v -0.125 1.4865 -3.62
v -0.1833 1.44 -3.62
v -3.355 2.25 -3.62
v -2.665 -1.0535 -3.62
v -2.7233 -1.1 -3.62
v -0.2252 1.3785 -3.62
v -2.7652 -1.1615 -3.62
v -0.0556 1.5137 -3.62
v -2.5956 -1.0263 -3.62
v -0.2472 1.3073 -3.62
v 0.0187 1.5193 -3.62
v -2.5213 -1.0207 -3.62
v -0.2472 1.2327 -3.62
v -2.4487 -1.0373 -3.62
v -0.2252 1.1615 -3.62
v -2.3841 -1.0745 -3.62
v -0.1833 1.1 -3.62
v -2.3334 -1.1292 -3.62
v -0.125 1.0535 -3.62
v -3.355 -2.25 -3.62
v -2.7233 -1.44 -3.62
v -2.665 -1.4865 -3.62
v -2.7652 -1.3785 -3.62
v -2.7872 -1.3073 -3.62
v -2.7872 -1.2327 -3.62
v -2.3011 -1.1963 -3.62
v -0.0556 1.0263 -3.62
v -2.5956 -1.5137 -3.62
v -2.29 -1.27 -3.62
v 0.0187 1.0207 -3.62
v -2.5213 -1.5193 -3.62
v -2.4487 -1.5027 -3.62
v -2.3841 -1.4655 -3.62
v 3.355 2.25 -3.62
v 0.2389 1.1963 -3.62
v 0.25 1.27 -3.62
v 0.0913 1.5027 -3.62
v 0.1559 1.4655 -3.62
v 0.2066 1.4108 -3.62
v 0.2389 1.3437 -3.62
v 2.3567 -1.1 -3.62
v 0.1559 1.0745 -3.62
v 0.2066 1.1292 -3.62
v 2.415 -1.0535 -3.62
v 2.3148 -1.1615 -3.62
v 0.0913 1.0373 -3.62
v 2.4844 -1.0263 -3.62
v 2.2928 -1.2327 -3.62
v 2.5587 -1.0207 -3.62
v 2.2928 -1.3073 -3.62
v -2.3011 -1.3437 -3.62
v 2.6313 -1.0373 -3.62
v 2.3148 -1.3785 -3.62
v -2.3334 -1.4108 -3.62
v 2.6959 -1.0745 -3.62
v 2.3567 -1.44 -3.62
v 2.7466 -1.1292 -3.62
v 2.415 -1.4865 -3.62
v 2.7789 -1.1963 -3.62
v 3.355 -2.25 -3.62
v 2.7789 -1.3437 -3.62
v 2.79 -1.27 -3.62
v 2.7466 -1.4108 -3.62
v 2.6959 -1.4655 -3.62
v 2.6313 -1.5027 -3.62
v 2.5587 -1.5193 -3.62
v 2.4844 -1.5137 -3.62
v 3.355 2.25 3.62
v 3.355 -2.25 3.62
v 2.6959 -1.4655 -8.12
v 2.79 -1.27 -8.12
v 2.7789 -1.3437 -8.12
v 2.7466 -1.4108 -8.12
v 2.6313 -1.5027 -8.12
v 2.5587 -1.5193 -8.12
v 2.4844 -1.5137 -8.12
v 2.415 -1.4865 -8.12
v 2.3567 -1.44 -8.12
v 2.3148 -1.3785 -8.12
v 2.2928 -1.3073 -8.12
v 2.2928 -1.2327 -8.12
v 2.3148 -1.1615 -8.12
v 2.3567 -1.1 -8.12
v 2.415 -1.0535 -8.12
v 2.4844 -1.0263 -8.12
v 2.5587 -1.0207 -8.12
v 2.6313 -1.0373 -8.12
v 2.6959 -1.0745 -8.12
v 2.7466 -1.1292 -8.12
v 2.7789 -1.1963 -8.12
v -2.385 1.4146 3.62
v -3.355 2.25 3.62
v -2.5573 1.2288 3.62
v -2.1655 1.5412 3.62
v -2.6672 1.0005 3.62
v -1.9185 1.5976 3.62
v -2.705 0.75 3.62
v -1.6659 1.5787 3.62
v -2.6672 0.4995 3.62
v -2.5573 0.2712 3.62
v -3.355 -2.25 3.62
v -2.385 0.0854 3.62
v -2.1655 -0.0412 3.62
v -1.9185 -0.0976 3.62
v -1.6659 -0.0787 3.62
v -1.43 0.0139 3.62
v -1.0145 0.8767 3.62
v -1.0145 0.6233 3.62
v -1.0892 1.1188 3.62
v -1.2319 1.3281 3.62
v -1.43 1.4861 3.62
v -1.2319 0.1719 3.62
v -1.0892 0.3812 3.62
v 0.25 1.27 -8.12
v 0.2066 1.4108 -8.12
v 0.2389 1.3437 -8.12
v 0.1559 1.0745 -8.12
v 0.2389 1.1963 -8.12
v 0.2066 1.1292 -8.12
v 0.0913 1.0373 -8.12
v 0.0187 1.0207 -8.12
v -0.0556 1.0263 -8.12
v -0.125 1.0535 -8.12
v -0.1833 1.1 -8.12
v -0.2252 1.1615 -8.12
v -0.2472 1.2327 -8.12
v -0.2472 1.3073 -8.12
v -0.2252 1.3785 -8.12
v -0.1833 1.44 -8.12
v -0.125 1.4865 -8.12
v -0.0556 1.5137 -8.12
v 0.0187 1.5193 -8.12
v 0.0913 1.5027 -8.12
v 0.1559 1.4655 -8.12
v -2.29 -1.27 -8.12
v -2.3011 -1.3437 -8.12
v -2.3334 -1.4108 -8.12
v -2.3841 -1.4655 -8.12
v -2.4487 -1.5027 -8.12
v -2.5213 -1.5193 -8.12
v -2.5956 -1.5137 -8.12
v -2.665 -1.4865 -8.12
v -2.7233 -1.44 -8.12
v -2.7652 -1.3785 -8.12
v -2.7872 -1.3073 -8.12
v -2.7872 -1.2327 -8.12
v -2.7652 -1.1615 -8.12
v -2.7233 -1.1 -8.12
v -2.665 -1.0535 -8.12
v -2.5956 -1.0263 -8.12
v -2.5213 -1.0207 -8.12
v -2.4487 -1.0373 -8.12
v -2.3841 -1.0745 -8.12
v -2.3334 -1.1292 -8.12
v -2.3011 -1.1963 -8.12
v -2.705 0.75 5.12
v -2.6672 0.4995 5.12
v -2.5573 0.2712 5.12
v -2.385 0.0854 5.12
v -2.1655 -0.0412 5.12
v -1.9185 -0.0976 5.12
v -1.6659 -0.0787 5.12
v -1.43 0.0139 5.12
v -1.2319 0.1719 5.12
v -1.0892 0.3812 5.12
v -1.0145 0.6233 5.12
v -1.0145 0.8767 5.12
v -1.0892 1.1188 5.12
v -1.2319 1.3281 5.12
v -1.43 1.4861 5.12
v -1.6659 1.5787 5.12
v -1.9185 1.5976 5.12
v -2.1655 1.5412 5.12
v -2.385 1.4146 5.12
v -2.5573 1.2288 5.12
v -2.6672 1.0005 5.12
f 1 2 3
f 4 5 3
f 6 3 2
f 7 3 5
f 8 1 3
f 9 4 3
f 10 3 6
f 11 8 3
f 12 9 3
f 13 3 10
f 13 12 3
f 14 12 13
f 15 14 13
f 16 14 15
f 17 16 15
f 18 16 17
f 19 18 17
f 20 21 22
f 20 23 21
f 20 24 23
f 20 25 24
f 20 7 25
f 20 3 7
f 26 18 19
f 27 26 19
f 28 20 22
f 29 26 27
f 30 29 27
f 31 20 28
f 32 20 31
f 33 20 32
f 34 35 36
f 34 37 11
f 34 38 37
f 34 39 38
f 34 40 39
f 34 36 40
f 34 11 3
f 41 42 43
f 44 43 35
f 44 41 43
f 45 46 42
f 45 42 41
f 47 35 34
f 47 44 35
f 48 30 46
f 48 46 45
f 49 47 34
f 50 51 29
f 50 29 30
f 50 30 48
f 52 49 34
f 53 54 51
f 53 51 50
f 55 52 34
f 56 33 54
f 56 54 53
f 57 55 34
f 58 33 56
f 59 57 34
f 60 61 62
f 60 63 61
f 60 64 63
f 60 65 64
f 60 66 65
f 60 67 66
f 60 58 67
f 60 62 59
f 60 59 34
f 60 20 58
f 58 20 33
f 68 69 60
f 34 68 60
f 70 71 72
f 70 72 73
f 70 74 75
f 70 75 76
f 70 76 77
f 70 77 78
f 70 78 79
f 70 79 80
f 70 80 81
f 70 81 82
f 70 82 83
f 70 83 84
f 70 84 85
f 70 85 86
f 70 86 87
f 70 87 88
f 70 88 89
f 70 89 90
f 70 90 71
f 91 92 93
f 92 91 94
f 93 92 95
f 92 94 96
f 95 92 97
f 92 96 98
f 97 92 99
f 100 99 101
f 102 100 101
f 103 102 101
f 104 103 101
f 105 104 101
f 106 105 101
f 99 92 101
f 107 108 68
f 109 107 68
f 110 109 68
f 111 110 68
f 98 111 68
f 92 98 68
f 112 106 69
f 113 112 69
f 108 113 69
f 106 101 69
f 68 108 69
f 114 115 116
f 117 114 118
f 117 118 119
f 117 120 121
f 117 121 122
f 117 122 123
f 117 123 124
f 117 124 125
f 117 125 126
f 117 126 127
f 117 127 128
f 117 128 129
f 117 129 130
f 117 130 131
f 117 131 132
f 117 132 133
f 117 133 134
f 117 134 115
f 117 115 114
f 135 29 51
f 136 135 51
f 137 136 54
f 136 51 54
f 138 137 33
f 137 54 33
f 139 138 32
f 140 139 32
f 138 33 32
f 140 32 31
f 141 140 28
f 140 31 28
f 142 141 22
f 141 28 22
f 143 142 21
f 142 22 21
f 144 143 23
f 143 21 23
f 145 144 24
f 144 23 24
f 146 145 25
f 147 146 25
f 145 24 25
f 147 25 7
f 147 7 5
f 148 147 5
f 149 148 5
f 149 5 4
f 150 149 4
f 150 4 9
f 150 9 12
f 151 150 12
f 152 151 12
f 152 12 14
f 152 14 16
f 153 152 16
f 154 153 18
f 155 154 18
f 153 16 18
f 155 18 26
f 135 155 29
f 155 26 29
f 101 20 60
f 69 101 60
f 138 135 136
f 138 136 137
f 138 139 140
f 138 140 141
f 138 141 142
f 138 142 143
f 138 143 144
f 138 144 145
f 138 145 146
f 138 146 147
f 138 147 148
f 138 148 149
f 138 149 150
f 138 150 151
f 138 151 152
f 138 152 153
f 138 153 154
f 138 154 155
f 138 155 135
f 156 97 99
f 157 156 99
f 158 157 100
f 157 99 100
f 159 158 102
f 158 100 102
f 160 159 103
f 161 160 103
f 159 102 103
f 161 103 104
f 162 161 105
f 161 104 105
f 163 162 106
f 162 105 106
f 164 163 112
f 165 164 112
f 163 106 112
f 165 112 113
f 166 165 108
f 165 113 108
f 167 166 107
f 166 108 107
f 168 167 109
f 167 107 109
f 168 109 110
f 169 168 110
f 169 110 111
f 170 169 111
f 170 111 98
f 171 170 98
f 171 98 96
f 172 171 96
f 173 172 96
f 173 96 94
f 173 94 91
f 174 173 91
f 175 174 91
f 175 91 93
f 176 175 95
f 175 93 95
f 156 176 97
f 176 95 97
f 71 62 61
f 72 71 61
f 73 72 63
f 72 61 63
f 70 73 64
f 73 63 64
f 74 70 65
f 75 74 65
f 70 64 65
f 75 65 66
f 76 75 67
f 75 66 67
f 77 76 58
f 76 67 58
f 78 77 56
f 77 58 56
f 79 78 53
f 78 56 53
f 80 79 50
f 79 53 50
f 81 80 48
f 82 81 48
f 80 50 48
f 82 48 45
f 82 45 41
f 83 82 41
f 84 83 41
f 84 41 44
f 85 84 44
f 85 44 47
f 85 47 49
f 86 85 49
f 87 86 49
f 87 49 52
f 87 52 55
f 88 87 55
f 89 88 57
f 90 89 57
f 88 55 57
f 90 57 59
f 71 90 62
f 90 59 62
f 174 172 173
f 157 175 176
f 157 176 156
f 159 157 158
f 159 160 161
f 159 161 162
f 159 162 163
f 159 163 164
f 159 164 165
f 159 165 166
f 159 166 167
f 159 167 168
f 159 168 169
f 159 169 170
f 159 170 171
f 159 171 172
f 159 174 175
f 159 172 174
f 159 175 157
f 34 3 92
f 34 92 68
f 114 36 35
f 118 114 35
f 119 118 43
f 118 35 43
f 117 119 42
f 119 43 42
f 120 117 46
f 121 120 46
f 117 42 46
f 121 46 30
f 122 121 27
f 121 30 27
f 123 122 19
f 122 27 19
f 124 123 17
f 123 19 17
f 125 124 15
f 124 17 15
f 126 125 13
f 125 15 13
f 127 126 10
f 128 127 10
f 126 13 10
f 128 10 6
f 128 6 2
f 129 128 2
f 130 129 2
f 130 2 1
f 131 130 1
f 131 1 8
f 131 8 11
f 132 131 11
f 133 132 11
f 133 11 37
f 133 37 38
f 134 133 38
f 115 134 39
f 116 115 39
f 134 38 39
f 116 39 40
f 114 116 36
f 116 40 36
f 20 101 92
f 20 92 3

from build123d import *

# Parameters (mm, degrees)
EXTRUDE_1_DEPTH      = 2.25
EXTRUDE_1_DEPTH_BACK = 2.25
SKETCH_1_W           = 6.71
SKETCH_1_H           = 7.24
SKETCH_3_R           = 0.25
EXTRUDE_3_DEPTH      = 4.5
SKETCH_4_R           = 0.85
EXTRUDE_4_DEPTH      = 1.5


with BuildPart() as part:
    # 草图1 → 拉伸1 (new, two sides: drawn at the far end of the back side and taken through both)
    with BuildSketch(Plane(origin=(0, 0, 0), x_dir=(1, 0, 0), z_dir=(0, 1, 0)).offset(-EXTRUDE_1_DEPTH_BACK)):
        Rectangle(SKETCH_1_W, SKETCH_1_H)
    extrude(amount=EXTRUDE_1_DEPTH + EXTRUDE_1_DEPTH_BACK)

    # 草图3 → 拉伸3 (add)
    with BuildSketch(Plane(origin=(0, 0, -3.62), x_dir=(-1, 0, 0), z_dir=(0, 0, -1))):
        with Locations((0, 1.27)):
            Circle(SKETCH_3_R)
        with Locations((2.54, -1.27)):
            Circle(SKETCH_3_R)
        with Locations((-2.54, -1.27)):
            Circle(SKETCH_3_R)
    extrude(amount=EXTRUDE_3_DEPTH)

    # 草图4 → 拉伸4 (add)
    with BuildSketch(Plane.XY.offset(3.62)):
        with Locations((-1.855, 0.75)):
            Circle(SKETCH_4_R)
    extrude(amount=EXTRUDE_4_DEPTH)


solid = part.part
